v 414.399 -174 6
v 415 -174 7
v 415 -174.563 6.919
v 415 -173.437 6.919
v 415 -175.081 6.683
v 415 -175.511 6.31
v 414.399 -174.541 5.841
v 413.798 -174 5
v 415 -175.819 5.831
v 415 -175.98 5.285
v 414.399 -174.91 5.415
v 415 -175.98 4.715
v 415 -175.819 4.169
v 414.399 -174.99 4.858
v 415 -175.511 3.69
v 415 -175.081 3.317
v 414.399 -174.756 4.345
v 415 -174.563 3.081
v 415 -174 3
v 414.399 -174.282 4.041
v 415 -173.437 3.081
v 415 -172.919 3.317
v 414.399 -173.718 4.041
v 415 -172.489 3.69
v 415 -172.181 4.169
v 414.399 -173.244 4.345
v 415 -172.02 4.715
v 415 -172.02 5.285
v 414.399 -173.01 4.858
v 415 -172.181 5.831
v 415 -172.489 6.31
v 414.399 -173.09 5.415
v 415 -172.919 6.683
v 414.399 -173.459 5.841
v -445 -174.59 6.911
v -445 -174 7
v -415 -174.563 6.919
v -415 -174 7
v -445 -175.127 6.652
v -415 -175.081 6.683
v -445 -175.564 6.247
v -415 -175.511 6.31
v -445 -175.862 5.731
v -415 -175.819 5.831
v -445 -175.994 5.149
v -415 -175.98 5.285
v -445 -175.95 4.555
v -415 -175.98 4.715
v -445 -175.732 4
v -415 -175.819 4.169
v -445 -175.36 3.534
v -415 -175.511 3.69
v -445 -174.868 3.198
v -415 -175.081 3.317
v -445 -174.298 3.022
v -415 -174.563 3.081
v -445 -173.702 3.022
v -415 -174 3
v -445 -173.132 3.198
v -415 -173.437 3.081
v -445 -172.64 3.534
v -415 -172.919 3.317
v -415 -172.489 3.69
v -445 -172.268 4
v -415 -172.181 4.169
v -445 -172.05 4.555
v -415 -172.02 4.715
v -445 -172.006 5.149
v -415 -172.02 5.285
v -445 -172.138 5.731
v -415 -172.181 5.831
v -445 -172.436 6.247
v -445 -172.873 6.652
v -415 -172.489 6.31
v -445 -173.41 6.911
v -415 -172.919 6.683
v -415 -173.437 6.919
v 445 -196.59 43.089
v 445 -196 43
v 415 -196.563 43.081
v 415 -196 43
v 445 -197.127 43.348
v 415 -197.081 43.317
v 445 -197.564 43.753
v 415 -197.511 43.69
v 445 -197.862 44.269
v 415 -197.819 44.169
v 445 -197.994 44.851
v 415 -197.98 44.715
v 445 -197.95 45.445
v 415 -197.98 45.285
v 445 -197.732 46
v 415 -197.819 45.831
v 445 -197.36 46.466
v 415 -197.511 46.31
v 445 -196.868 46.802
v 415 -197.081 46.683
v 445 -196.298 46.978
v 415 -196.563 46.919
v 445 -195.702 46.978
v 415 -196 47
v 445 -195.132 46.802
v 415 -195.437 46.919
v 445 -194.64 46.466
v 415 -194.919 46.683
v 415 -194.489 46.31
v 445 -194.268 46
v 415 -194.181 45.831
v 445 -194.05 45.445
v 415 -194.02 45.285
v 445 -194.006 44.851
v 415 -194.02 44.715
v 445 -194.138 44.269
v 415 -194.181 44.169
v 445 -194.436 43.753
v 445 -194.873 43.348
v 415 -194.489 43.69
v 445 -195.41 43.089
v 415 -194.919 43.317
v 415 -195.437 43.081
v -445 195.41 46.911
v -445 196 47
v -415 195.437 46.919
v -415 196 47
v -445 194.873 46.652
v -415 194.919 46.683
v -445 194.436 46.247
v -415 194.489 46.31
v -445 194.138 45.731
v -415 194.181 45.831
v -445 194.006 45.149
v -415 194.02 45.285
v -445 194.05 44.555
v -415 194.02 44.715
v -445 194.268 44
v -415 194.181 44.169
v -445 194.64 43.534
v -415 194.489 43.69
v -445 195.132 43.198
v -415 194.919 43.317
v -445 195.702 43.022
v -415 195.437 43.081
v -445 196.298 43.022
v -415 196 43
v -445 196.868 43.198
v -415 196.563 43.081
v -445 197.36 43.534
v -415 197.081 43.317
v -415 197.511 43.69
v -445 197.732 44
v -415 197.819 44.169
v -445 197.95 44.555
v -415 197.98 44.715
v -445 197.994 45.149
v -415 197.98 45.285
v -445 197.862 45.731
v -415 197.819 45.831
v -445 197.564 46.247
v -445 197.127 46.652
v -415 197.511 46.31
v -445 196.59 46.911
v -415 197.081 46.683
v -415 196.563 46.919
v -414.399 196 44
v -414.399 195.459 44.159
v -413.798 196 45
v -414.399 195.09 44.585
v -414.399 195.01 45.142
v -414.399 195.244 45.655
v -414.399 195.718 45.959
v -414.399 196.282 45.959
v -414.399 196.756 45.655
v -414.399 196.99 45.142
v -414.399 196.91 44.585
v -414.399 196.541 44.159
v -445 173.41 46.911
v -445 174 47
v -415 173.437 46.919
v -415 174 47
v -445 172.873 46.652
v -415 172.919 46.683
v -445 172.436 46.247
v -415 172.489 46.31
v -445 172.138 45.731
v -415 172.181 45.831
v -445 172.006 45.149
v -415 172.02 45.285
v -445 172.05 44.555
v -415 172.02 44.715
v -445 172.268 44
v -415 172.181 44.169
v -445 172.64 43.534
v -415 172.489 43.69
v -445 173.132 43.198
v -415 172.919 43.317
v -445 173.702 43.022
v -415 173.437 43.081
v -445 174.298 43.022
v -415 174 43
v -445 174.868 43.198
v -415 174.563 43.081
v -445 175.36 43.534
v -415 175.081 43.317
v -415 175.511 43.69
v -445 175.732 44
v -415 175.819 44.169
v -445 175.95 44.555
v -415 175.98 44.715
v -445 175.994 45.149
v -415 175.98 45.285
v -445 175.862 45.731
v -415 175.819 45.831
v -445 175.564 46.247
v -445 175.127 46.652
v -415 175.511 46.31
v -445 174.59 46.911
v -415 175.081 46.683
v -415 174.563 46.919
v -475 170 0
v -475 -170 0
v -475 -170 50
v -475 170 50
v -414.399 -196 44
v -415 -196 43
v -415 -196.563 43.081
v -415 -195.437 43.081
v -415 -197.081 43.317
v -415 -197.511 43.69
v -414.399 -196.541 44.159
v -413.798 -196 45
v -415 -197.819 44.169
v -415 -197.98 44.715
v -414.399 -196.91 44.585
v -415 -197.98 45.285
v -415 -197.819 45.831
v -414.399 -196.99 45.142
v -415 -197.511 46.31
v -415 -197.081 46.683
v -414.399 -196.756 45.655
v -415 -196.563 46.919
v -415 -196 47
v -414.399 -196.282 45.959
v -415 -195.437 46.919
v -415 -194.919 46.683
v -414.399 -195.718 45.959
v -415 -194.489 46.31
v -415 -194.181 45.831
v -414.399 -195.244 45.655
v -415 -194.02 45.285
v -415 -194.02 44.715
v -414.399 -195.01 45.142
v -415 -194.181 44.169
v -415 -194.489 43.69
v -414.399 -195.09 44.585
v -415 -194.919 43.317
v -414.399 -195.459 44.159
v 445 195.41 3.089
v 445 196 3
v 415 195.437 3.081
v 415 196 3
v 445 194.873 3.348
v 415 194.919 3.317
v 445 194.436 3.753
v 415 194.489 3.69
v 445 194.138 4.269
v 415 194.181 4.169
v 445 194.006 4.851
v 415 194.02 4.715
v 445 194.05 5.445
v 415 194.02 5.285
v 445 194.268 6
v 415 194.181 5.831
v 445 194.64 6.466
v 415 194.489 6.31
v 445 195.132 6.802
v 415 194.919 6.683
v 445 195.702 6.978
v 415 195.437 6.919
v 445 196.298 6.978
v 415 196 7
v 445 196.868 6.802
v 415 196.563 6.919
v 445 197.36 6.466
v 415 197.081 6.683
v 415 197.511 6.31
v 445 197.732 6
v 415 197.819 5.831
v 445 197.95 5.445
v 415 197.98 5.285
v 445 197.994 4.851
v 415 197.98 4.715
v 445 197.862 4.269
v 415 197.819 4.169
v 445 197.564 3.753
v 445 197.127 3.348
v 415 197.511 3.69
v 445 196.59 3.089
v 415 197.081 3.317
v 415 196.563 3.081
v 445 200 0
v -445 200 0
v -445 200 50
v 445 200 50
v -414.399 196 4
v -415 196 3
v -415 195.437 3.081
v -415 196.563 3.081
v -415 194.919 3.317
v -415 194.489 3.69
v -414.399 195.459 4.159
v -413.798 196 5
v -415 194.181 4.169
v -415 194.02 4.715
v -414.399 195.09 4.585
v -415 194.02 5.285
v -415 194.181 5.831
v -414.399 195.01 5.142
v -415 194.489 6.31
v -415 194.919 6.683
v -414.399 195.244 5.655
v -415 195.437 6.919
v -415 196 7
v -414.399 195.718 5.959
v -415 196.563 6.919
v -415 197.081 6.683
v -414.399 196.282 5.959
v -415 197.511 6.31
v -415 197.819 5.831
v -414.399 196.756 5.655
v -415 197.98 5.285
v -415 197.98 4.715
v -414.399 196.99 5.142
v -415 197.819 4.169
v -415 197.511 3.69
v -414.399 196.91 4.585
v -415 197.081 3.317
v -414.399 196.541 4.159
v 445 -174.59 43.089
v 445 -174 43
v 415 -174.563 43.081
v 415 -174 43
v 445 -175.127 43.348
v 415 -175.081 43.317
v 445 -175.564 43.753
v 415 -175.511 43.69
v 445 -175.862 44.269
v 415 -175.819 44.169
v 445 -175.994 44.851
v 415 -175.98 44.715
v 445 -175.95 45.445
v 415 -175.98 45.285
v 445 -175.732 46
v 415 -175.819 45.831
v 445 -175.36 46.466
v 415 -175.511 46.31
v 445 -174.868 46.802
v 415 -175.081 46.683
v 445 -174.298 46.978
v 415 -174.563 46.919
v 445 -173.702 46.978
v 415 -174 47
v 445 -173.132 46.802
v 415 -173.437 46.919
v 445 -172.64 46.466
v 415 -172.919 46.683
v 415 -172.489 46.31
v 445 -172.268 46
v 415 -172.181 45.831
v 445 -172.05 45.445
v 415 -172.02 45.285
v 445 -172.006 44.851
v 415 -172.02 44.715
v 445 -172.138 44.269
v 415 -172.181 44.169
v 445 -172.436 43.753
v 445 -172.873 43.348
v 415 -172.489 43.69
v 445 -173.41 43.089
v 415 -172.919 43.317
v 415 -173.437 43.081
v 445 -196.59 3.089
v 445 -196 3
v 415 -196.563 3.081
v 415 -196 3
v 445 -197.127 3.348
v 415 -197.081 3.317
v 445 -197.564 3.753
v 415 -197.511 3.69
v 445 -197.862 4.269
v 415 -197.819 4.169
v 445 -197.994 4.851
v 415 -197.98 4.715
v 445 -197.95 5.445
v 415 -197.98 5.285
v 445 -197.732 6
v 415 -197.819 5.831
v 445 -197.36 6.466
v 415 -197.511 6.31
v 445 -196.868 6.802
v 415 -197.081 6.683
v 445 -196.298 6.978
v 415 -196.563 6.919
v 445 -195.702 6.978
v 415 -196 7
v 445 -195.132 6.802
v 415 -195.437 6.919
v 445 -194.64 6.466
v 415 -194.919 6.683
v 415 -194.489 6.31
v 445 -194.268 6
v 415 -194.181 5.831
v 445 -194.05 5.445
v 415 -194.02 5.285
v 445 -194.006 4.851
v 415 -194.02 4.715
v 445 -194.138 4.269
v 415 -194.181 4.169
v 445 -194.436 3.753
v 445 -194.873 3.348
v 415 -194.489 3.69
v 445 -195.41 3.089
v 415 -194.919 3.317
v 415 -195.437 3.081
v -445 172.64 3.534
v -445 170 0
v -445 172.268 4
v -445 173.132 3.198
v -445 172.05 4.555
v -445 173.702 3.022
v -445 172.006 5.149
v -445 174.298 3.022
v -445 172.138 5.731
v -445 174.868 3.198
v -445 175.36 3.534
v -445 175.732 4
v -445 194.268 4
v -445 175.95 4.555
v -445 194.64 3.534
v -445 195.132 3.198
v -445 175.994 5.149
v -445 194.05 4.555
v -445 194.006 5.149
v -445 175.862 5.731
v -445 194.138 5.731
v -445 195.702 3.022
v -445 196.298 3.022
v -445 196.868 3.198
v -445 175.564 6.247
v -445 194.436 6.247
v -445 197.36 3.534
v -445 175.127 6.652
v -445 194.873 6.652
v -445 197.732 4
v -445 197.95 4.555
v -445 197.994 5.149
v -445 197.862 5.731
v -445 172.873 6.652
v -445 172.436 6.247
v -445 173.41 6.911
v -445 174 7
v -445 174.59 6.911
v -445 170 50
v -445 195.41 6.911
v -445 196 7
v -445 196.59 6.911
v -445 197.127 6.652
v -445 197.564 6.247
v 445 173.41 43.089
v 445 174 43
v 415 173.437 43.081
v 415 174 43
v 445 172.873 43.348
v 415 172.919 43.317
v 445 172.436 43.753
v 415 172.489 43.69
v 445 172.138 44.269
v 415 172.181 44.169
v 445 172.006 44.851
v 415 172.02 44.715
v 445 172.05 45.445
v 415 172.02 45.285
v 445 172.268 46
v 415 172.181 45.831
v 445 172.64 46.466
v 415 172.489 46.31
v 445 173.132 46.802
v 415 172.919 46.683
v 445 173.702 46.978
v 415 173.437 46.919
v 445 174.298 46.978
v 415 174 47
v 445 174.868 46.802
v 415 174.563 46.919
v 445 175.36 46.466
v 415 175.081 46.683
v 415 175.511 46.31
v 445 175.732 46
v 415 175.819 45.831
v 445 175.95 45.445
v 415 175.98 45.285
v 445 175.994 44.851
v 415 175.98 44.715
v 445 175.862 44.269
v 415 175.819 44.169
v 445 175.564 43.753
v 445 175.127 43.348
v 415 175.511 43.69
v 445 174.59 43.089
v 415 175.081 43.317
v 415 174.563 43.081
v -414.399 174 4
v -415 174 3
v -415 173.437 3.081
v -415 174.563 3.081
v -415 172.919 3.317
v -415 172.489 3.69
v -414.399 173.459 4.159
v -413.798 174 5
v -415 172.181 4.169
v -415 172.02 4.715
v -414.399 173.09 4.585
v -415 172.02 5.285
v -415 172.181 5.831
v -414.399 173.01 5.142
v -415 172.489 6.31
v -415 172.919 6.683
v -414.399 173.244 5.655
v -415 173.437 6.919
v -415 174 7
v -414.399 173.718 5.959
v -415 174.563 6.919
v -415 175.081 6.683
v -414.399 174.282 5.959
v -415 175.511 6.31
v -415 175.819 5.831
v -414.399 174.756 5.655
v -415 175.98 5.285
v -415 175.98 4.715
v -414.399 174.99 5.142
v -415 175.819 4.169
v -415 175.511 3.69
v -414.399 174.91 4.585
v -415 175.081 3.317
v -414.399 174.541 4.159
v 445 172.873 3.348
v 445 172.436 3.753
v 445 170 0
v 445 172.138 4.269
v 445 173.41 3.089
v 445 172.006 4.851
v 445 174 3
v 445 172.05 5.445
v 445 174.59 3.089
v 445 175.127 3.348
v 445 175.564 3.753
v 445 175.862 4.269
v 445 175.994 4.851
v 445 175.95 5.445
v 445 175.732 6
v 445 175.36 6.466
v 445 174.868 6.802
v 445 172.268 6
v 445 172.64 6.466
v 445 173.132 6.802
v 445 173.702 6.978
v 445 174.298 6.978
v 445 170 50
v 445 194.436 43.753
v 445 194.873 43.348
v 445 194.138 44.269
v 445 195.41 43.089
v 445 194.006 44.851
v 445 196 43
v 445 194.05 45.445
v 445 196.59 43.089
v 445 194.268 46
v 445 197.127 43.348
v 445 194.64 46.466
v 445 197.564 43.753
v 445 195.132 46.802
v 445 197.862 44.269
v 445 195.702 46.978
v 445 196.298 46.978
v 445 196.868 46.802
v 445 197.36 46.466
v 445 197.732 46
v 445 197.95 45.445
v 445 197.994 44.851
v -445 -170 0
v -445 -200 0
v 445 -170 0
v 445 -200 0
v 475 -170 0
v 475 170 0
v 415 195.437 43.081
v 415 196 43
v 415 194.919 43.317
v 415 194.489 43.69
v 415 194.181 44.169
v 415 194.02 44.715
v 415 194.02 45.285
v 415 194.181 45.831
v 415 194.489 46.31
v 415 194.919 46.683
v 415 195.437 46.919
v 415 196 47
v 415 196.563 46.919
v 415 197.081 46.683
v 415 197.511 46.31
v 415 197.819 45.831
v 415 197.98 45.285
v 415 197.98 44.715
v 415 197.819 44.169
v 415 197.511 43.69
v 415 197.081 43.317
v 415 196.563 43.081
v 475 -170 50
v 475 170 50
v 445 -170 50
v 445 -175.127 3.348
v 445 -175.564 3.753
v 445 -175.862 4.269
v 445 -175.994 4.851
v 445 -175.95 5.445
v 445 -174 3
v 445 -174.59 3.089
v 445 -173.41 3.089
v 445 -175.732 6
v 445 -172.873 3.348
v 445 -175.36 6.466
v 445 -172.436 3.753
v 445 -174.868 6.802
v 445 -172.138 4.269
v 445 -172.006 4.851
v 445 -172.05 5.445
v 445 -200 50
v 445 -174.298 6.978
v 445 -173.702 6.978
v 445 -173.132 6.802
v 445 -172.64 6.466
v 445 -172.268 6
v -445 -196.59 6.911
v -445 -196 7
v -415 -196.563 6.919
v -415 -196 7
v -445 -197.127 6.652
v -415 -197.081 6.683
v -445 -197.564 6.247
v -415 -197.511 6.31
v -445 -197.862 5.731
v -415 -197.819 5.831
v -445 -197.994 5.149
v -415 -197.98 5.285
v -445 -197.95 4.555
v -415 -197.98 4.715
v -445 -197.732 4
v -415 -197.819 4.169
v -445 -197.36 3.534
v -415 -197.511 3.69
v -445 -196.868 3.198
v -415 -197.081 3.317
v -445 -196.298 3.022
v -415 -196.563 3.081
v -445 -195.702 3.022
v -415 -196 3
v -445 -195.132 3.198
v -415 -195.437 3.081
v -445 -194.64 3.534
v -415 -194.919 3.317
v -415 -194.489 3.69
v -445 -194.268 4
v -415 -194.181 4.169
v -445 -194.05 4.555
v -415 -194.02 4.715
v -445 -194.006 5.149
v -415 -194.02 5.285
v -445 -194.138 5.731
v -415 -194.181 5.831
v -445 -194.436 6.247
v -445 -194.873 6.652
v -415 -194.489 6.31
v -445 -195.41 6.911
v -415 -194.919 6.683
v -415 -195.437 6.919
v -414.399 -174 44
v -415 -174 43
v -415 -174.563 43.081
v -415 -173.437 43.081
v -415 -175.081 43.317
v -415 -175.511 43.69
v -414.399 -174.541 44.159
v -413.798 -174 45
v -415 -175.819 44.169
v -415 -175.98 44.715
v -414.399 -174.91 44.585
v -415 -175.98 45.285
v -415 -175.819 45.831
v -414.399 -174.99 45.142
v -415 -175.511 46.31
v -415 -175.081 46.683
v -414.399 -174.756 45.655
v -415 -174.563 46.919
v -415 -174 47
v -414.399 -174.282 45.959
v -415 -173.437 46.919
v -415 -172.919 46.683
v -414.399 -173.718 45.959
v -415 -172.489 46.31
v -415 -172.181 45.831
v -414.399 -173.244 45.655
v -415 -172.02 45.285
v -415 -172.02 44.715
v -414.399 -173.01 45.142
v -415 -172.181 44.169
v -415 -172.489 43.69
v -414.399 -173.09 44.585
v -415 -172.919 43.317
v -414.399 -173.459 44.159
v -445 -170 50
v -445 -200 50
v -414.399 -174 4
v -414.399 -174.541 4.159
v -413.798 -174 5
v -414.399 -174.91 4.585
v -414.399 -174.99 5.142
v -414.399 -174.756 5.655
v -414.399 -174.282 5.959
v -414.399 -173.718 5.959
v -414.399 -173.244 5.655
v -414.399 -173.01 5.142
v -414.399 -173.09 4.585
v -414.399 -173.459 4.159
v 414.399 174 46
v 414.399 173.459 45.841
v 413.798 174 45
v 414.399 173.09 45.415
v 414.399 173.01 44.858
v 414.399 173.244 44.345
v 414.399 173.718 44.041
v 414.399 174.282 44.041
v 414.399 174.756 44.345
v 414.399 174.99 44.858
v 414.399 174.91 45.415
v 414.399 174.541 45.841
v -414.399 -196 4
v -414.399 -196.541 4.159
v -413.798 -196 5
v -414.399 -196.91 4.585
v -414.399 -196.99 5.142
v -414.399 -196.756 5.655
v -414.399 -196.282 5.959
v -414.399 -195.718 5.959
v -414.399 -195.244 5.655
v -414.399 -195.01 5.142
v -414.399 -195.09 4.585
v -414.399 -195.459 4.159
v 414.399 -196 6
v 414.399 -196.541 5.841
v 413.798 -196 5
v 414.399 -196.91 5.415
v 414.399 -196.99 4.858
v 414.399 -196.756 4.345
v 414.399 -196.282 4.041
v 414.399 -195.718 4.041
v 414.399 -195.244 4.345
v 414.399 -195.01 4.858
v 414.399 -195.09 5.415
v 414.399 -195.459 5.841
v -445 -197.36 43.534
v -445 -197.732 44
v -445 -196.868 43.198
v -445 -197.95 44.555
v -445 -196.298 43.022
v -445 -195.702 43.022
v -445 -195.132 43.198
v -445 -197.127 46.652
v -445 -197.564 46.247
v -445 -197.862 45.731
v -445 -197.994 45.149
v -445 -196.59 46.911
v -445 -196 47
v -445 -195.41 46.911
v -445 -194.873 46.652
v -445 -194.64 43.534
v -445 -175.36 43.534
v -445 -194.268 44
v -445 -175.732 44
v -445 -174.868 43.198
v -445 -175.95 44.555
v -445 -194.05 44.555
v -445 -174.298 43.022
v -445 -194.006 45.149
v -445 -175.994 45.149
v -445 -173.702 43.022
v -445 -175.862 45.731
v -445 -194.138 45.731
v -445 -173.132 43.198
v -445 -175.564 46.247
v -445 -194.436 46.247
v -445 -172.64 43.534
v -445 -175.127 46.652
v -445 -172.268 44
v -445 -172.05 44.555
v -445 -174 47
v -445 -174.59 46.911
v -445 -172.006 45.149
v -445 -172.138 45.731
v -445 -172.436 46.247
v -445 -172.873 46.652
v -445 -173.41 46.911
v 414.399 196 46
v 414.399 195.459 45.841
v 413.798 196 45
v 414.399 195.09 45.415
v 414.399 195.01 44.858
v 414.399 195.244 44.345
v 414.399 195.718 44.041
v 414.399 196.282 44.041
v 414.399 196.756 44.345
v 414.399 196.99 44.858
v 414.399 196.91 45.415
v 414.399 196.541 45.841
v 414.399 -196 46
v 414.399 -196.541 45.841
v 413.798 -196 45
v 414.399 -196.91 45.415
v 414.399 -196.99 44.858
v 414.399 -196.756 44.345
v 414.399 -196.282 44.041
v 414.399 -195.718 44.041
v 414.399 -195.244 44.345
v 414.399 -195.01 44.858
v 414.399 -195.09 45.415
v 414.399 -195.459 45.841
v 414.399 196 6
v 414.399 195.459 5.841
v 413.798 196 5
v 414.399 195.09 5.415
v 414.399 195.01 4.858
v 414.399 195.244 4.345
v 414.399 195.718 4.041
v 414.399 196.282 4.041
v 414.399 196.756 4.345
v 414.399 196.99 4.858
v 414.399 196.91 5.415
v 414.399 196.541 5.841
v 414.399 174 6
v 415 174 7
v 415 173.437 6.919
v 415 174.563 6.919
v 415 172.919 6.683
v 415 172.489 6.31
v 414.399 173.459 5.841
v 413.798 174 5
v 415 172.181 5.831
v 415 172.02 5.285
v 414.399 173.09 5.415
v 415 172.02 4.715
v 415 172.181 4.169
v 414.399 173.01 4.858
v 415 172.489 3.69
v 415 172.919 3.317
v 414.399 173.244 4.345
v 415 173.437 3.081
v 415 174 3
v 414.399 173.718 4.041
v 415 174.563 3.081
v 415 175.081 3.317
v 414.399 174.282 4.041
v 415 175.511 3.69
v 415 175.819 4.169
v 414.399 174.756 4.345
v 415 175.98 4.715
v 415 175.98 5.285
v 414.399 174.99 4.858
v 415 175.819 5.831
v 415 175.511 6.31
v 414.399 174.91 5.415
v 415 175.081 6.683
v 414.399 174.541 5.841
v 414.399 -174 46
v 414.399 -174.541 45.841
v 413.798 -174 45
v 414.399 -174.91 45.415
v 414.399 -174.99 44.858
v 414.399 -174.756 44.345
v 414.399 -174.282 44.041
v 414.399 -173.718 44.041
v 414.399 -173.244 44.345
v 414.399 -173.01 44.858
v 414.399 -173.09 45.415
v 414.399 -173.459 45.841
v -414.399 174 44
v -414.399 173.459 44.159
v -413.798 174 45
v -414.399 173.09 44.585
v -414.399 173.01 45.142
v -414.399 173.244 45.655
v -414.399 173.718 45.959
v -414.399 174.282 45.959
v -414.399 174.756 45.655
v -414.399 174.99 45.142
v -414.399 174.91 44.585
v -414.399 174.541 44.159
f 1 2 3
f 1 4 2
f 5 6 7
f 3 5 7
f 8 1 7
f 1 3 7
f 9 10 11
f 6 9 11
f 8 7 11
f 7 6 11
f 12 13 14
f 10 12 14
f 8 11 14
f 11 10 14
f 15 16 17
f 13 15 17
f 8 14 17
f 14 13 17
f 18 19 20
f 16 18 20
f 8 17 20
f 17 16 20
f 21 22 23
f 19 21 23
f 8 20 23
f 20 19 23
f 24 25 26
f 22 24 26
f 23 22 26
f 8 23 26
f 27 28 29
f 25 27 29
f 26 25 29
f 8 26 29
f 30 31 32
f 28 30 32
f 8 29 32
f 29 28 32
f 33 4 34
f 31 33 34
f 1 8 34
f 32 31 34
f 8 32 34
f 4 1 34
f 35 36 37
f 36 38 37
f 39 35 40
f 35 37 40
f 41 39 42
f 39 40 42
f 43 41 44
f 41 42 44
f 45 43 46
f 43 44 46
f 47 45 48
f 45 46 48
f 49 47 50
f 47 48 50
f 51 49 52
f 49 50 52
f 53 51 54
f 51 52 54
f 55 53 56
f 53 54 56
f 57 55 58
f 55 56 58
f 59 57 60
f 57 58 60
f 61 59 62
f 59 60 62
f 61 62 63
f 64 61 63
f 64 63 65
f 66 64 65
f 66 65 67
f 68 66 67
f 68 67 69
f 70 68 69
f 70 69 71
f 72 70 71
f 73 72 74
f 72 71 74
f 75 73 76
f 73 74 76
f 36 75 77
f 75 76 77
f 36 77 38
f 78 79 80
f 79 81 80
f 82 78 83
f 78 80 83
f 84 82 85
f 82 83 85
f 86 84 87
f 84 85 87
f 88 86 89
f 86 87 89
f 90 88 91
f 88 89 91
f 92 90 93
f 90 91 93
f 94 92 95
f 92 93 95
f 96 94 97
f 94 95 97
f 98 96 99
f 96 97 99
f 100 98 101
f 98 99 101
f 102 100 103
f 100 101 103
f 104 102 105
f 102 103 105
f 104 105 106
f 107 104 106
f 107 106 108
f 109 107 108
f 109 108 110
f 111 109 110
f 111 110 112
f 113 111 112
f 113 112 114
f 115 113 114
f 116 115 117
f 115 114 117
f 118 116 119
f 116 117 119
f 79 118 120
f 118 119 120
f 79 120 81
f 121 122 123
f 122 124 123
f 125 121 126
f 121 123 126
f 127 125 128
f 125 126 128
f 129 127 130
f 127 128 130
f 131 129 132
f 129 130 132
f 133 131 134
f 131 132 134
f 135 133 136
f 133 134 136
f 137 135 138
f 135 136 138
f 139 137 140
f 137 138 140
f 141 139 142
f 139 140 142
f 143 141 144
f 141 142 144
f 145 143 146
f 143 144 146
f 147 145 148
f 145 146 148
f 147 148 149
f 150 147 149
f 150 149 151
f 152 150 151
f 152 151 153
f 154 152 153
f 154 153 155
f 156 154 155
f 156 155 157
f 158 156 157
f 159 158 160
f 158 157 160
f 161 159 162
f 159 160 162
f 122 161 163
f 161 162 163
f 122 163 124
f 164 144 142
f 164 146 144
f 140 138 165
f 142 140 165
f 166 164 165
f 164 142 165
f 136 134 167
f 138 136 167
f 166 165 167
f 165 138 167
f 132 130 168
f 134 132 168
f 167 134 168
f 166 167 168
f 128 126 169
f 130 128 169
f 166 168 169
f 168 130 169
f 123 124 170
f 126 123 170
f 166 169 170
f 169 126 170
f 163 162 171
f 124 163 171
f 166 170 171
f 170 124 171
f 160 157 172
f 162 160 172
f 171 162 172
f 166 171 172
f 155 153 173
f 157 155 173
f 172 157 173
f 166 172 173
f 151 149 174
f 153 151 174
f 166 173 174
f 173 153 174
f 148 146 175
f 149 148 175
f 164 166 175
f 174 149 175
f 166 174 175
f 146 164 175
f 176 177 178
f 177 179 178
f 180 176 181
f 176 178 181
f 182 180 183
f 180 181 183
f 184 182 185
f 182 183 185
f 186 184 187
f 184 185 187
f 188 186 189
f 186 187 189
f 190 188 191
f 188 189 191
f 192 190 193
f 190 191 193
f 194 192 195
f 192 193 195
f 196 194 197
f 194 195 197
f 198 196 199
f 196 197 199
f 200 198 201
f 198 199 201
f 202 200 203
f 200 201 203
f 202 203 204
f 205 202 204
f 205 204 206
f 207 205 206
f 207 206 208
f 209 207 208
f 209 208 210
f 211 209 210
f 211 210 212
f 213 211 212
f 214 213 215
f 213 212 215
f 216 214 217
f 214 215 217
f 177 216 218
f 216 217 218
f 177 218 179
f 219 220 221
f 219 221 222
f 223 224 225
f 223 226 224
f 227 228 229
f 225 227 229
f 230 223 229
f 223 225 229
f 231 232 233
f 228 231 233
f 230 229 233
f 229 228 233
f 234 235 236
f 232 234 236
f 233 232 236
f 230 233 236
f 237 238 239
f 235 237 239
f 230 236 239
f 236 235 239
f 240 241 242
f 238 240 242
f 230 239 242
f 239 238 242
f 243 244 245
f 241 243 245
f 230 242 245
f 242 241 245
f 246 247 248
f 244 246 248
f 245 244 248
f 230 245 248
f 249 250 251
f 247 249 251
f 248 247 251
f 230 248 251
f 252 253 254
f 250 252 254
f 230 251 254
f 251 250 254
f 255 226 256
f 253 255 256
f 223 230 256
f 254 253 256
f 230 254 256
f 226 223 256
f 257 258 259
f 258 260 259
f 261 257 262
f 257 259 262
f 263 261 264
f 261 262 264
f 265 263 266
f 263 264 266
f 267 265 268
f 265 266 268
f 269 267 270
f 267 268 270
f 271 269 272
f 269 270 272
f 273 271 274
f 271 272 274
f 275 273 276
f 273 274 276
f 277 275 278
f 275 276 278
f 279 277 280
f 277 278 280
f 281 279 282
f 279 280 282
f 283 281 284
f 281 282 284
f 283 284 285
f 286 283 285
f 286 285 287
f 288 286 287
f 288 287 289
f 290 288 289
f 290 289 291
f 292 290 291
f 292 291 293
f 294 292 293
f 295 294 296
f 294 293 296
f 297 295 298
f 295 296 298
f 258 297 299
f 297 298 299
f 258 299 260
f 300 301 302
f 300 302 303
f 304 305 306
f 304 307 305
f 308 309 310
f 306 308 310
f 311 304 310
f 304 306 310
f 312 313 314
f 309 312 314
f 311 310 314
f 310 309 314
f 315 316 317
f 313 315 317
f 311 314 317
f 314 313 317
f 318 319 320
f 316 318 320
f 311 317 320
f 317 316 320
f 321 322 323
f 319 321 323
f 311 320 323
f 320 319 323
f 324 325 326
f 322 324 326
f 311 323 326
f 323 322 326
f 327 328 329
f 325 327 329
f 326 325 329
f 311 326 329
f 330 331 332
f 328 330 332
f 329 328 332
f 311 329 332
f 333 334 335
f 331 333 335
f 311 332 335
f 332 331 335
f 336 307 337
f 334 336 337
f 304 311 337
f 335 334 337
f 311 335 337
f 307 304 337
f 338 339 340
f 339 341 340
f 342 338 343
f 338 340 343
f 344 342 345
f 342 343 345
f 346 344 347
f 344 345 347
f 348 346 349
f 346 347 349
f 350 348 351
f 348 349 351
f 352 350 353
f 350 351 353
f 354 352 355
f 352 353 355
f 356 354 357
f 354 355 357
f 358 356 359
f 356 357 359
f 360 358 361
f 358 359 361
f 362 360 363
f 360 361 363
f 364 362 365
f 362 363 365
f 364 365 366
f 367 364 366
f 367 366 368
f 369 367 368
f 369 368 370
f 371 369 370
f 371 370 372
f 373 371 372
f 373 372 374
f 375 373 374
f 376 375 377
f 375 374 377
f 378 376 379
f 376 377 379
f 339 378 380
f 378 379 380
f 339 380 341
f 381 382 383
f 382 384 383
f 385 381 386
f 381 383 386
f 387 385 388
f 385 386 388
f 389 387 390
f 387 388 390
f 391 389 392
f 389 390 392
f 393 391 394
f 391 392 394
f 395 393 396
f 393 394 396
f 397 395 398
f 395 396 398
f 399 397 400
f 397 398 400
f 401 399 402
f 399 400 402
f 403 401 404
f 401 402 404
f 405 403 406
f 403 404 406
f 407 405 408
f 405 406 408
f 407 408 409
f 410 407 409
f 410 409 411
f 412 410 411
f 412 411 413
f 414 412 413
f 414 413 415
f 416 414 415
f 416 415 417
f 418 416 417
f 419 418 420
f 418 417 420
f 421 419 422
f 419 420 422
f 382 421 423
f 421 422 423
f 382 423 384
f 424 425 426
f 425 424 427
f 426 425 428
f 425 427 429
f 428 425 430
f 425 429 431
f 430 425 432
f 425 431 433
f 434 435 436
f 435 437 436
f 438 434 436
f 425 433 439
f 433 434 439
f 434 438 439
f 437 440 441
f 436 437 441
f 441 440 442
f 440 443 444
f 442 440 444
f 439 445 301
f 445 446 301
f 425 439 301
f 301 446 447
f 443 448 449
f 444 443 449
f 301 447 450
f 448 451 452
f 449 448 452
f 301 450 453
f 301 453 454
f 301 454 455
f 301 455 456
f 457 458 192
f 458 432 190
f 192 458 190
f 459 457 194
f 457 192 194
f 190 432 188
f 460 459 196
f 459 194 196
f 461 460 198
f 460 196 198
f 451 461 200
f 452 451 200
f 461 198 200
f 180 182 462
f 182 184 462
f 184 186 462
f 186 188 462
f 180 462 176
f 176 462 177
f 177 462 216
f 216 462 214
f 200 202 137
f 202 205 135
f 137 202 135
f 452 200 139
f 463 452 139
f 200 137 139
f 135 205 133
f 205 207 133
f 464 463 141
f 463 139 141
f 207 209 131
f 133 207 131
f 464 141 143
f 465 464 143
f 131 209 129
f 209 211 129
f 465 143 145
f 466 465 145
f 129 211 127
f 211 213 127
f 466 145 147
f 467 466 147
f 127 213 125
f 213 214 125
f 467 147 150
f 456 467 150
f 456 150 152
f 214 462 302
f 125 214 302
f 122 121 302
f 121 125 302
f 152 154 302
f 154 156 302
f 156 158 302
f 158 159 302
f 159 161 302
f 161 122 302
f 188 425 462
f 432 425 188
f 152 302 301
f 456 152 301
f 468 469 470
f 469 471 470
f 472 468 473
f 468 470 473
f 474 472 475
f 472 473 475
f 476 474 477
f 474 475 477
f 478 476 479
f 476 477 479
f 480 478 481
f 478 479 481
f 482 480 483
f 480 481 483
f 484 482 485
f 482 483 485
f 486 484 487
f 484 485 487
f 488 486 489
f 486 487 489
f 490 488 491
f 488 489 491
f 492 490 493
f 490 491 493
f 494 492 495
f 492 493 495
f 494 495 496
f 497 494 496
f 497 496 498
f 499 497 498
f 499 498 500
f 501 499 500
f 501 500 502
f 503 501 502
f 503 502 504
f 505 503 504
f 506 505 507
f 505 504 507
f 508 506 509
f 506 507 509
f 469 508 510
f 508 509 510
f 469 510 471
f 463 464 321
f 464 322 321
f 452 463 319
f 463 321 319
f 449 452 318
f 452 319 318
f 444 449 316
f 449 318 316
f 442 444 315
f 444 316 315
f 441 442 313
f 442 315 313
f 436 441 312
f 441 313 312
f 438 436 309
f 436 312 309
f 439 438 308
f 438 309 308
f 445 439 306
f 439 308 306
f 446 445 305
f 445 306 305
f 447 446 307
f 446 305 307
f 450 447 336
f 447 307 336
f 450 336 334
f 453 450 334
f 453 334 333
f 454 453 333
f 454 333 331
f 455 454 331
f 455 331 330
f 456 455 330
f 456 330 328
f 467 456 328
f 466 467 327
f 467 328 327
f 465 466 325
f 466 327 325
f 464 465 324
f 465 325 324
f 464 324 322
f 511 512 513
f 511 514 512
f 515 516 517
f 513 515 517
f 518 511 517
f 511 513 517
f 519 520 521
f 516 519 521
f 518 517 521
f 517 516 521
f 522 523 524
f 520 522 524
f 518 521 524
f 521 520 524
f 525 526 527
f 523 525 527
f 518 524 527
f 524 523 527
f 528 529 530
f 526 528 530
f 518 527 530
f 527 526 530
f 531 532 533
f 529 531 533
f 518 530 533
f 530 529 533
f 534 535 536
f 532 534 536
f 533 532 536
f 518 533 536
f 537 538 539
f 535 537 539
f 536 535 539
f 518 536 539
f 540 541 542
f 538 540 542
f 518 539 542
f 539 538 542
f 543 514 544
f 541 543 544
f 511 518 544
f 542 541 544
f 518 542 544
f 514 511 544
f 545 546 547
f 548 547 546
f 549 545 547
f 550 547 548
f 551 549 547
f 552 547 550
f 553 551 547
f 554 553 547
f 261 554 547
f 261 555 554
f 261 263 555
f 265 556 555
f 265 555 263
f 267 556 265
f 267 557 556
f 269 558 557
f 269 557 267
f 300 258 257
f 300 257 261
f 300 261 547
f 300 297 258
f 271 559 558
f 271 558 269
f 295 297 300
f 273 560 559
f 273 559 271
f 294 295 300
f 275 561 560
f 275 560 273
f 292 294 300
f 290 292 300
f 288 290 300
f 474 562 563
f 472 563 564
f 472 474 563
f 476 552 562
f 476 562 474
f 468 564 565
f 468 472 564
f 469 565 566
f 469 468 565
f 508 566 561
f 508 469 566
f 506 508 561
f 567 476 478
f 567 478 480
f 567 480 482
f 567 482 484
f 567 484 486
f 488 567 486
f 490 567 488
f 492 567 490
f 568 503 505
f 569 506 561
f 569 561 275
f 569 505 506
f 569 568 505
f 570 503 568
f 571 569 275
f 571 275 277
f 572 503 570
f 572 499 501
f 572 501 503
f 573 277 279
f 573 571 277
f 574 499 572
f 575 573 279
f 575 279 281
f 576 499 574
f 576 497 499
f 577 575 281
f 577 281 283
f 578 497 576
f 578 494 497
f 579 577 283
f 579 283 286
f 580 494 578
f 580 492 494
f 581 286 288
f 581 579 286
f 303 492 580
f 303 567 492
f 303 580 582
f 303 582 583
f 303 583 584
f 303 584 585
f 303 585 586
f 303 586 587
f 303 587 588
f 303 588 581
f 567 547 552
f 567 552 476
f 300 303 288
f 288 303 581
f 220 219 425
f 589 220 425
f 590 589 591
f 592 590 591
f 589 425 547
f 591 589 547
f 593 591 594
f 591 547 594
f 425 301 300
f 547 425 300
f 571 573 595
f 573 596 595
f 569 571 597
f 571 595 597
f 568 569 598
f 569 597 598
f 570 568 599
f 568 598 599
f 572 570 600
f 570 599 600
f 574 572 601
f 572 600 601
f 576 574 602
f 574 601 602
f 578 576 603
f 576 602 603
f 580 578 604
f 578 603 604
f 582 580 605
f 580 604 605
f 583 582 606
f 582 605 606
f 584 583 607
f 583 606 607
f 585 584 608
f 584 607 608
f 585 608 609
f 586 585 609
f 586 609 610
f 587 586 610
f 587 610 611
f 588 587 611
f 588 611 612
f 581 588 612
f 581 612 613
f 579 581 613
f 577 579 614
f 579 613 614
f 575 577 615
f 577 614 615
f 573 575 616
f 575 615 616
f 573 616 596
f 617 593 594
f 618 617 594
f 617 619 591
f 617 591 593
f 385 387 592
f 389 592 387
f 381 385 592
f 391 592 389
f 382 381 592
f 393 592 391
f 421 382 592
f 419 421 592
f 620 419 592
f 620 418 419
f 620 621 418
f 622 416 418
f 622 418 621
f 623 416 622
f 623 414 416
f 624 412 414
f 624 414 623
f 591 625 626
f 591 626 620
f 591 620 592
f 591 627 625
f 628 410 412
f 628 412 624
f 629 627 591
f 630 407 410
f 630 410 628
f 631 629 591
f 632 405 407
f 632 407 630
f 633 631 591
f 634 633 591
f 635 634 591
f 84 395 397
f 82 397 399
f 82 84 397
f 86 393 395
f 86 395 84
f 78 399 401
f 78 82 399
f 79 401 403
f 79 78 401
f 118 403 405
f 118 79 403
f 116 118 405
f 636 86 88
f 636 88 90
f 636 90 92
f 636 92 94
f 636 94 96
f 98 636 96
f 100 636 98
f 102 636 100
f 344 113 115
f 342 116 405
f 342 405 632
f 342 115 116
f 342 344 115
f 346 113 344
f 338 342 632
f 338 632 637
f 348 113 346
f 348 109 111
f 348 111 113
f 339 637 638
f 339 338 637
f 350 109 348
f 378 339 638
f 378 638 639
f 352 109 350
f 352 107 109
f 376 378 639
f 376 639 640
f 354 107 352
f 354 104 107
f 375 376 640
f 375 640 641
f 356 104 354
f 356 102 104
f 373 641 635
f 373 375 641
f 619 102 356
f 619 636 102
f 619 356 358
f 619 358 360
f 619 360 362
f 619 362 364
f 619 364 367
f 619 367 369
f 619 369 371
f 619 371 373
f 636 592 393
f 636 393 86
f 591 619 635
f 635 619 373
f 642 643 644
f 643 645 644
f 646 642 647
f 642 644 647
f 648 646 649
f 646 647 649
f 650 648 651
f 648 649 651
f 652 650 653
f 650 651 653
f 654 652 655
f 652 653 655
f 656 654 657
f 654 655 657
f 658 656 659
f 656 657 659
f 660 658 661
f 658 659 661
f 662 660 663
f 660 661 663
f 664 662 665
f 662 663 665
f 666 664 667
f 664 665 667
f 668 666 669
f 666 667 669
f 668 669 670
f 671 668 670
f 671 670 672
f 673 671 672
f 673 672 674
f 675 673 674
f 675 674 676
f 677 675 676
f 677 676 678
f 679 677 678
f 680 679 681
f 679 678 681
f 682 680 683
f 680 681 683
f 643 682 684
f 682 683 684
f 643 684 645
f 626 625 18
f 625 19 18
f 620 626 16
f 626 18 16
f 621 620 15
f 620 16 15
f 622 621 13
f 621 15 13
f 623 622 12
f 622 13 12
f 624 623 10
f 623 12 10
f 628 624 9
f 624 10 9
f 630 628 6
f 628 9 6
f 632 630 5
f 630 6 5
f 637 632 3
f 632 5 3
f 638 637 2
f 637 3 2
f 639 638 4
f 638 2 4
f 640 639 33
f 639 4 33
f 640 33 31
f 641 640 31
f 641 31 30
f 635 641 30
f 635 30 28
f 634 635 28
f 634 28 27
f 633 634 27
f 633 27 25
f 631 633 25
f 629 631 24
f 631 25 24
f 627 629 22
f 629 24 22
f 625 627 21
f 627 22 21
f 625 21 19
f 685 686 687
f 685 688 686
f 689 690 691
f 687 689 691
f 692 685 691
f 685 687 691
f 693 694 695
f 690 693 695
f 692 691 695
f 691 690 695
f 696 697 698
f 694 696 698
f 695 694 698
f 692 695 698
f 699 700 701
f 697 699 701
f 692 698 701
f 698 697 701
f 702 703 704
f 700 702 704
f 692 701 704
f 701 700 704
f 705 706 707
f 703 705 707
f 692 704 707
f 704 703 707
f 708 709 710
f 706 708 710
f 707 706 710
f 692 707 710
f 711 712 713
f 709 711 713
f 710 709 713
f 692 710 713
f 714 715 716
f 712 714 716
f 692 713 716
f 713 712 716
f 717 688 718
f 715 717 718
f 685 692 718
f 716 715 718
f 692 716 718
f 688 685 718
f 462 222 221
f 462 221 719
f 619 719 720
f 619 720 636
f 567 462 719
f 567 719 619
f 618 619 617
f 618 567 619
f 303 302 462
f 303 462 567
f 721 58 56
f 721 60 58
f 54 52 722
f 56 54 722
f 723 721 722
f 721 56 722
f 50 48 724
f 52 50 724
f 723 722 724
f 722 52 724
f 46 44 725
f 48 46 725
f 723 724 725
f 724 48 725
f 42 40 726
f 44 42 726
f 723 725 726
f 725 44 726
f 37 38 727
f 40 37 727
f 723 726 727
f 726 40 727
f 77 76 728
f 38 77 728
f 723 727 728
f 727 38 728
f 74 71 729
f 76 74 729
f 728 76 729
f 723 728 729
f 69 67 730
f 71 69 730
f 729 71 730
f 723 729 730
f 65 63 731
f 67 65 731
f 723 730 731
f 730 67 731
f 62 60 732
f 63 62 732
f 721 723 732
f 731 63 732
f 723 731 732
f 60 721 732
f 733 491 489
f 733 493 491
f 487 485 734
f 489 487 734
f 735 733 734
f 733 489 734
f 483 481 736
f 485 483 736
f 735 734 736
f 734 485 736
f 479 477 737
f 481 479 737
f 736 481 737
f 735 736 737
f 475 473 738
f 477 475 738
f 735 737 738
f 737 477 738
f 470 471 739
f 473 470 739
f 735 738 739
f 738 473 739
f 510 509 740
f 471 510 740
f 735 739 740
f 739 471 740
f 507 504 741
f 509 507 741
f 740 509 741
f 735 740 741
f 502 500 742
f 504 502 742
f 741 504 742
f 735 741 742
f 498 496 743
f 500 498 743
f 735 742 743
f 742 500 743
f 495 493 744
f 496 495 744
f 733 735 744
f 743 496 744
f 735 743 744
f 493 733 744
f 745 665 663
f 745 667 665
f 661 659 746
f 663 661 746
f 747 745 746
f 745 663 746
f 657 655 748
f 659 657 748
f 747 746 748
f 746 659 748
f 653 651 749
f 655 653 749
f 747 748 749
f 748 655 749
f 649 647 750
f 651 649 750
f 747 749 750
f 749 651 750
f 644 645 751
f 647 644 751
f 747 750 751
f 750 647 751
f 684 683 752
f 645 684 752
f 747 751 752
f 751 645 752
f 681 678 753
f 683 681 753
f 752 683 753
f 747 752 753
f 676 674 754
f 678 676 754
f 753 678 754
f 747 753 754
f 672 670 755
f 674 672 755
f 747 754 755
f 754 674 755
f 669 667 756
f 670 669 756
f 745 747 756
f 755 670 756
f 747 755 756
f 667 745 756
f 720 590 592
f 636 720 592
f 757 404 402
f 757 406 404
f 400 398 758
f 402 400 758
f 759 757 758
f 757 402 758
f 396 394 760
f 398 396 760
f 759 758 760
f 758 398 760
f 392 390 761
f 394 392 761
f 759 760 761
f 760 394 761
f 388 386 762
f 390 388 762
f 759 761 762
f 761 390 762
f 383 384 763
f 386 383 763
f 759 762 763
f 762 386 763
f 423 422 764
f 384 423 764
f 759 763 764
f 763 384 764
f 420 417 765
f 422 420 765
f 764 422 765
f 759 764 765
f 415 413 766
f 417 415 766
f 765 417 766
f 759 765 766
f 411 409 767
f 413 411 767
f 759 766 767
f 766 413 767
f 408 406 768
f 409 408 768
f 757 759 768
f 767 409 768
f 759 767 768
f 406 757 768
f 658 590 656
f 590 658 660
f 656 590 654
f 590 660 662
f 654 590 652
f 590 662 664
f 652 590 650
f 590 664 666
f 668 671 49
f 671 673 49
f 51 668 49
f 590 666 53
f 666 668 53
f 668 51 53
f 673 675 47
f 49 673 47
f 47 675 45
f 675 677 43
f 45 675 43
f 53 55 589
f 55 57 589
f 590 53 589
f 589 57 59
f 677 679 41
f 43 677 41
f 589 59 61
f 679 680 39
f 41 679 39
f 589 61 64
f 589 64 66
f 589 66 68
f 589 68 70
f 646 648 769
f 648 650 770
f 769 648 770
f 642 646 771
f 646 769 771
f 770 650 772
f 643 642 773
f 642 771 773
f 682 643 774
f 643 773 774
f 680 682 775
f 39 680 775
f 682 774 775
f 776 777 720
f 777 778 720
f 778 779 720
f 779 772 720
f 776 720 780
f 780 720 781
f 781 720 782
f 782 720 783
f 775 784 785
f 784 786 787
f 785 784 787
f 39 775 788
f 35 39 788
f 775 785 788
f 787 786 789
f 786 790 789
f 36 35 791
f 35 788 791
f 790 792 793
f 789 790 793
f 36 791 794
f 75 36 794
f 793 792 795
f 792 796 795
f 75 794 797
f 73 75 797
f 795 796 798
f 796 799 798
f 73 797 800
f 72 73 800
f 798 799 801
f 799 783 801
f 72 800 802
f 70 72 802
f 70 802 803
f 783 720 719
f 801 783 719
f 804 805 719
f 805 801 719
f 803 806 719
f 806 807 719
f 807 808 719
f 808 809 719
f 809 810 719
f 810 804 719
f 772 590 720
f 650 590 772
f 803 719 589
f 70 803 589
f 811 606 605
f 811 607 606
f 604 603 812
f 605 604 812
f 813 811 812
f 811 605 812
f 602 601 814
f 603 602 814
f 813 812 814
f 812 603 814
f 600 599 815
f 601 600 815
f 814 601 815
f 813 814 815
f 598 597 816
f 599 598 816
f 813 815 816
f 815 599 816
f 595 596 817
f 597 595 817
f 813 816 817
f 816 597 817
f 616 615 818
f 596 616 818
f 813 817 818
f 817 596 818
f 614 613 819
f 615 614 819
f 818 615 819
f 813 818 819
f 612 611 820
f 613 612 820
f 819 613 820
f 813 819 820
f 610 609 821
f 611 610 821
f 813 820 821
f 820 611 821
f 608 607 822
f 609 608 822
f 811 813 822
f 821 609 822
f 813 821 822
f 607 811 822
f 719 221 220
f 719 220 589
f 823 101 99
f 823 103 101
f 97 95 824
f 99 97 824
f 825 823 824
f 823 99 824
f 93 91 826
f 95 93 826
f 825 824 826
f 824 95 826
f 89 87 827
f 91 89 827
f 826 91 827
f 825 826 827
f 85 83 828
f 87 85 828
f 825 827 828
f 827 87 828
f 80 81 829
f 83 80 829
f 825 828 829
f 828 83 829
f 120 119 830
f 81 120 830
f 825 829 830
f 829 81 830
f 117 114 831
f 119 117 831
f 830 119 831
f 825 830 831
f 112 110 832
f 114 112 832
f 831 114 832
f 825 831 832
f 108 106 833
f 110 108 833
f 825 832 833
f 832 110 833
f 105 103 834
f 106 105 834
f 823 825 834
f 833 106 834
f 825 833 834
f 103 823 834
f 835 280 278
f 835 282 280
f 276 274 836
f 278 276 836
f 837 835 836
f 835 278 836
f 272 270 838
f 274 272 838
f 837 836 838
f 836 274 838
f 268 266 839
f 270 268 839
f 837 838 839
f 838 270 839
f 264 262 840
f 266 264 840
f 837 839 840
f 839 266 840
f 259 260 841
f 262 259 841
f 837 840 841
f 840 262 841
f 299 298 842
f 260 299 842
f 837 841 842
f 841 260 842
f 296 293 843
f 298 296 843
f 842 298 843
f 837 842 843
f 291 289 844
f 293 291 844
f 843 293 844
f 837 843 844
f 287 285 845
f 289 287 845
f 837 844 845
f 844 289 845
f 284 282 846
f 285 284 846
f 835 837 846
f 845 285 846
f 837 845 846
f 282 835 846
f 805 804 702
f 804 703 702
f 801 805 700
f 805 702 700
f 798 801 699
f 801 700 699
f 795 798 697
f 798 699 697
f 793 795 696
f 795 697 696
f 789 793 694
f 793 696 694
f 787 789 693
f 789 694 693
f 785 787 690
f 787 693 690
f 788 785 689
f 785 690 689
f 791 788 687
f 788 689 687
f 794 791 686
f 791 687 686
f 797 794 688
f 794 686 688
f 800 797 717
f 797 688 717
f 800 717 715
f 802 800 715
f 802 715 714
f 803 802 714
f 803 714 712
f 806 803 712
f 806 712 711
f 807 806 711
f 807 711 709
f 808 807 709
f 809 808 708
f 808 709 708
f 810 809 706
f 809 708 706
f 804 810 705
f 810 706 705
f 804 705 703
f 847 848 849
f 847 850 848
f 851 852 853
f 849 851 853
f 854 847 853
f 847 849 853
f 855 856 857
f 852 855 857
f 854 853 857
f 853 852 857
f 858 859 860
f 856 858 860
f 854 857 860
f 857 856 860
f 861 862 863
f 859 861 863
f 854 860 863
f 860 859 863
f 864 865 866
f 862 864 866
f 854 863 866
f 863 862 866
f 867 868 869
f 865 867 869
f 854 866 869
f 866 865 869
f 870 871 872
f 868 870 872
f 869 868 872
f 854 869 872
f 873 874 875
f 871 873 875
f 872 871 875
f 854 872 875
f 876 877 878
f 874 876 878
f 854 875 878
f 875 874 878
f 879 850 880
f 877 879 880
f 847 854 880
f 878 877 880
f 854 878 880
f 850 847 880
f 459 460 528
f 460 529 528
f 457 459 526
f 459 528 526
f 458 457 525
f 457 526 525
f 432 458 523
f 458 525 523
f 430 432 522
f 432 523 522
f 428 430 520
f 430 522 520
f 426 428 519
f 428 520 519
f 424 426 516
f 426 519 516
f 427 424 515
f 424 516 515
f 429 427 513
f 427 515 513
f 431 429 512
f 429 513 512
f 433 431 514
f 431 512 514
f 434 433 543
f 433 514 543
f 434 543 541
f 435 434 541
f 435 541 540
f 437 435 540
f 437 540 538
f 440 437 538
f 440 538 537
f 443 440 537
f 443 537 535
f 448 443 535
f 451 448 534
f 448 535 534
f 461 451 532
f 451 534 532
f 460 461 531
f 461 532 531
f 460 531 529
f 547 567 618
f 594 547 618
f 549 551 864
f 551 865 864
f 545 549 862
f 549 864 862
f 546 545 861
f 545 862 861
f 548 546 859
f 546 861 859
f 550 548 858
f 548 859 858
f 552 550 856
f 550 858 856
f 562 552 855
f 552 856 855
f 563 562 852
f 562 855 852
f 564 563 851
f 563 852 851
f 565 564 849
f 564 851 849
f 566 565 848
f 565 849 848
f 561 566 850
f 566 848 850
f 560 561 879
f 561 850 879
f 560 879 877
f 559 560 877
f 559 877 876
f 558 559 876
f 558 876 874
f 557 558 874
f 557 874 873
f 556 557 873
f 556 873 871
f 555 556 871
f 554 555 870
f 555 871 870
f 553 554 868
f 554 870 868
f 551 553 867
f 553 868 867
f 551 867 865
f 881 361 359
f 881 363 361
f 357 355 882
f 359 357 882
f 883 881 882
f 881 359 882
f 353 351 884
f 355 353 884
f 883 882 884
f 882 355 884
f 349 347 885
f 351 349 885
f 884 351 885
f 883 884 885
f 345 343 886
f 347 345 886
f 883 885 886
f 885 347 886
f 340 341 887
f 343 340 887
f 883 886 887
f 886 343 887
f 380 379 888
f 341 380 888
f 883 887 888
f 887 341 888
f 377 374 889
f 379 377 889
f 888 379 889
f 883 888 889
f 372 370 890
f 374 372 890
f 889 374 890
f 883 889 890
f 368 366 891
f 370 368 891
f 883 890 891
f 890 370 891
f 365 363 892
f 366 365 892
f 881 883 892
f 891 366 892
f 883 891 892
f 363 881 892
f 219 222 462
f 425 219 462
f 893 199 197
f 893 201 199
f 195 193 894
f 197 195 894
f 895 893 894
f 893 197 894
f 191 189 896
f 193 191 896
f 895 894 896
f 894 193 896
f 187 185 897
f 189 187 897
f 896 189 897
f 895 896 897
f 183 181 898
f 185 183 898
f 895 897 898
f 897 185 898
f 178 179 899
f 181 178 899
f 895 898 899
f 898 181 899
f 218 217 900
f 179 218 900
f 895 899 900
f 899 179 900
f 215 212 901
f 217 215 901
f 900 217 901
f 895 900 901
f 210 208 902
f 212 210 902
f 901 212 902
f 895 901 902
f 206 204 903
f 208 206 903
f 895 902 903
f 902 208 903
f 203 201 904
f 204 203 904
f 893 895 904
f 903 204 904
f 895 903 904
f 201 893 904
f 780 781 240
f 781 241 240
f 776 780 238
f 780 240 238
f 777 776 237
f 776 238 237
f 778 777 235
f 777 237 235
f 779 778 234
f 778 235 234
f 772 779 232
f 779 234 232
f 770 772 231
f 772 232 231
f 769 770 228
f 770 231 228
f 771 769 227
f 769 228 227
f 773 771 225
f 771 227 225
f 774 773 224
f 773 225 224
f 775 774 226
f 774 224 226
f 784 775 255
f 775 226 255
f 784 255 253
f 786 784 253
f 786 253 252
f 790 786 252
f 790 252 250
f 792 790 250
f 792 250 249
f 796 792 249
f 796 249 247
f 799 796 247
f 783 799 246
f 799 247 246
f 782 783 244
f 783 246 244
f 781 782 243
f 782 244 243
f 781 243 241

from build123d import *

# Parameters (mm, degrees)
SKETCH1_W                 = 950
SKETCH1_H                 = 400
BOSS_EXTRUDE1_DEPTH       = 50
SKETCH2_W                 = 30
SKETCH2_H                 = 30
CUT_EXTRUDE1_DEPTH        = 518.80787943
F_4_0MM_DOWEL_HOLE1_D     = 4
F_4_0MM_DOWEL_HOLE1_DEPTH = 30
F_4_0MM_DOWEL_HOLE1_TIP   = 1.201721238
F_4_0MM_DOWEL_HOLE2_D     = 4
F_4_0MM_DOWEL_HOLE2_DEPTH = 30
F_4_0MM_DOWEL_HOLE2_TIP   = 1.201721238
F_4_0MM_DOWEL_HOLE3_D     = 4
F_4_0MM_DOWEL_HOLE3_DEPTH = 30
F_4_0MM_DOWEL_HOLE3_TIP   = 1.201721238
F_4_0MM_DOWEL_HOLE4_D     = 4
F_4_0MM_DOWEL_HOLE4_DEPTH = 30
F_4_0MM_DOWEL_HOLE4_TIP   = 1.201721238


with BuildPart() as part:
    # Sketch1 → Boss-Extrude1 (new body)
    with BuildSketch(Plane.XY):
        Rectangle(SKETCH1_W, SKETCH1_H)
    extrude(amount=BOSS_EXTRUDE1_DEPTH)

    # Sketch2 → Cut-Extrude1 (cut, through all)
    with BuildSketch(Plane.XY.offset(50)):
        with Locations((-460, 185)):
            Rectangle(SKETCH2_W, SKETCH2_H)
        with Locations((-460, -185)):
            Rectangle(SKETCH2_W, SKETCH2_H)
        with Locations((460, -185)):
            Rectangle(SKETCH2_W, SKETCH2_H)
        with Locations((460, 185)):
            Rectangle(SKETCH2_W, SKETCH2_H)
    extrude(amount=-CUT_EXTRUDE1_DEPTH, mode=Mode.SUBTRACT)

    # Ø4.0mm Dowel Hole1
    with Locations(Plane(origin=(445, -196, 45), x_dir=(0, 0, 1), z_dir=(1, 0, 0))):
        with Locations((0, 0), (0, -22), (-40, 0), (-40, -22)):
            Hole(F_4_0MM_DOWEL_HOLE1_D / 2, depth=F_4_0MM_DOWEL_HOLE1_DEPTH)
            with Locations((0, 0, -(F_4_0MM_DOWEL_HOLE1_DEPTH + F_4_0MM_DOWEL_HOLE1_TIP / 2))):  # 118° drill point
                Cone(0, F_4_0MM_DOWEL_HOLE1_D / 2, F_4_0MM_DOWEL_HOLE1_TIP, mode=Mode.SUBTRACT)

    # Ø4.0mm Dowel Hole2
    with Locations(Plane(origin=(-445, -174, 5), x_dir=(0, 0, -1), z_dir=(-1, 0, 0))):
        with Locations((0, 0), (-40, 0), (-40, 22), (0, 22)):
            Hole(F_4_0MM_DOWEL_HOLE2_D / 2, depth=F_4_0MM_DOWEL_HOLE2_DEPTH)
            with Locations((0, 0, -(F_4_0MM_DOWEL_HOLE2_DEPTH + F_4_0MM_DOWEL_HOLE2_TIP / 2))):  # 118° drill point
                Cone(0, F_4_0MM_DOWEL_HOLE2_D / 2, F_4_0MM_DOWEL_HOLE2_TIP, mode=Mode.SUBTRACT)

    # Ø4.0mm Dowel Hole3
    with Locations(Plane(origin=(-445, 174, 45), x_dir=(0, 0, -1), z_dir=(-1, 0, 0))):
        with Locations((0, 0), (0, -22), (40, -22), (40, 0)):
            Hole(F_4_0MM_DOWEL_HOLE3_D / 2, depth=F_4_0MM_DOWEL_HOLE3_DEPTH)
            with Locations((0, 0, -(F_4_0MM_DOWEL_HOLE3_DEPTH + F_4_0MM_DOWEL_HOLE3_TIP / 2))):  # 118° drill point
                Cone(0, F_4_0MM_DOWEL_HOLE3_D / 2, F_4_0MM_DOWEL_HOLE3_TIP, mode=Mode.SUBTRACT)

    # Ø4.0mm Dowel Hole4
    with Locations(Plane(origin=(445, 174, 45), x_dir=(0, 0, 1), z_dir=(1, 0, 0))):
        with Locations((0, 0), (0, -22), (-40, 0), (-40, -22)):
            Hole(F_4_0MM_DOWEL_HOLE4_D / 2, depth=F_4_0MM_DOWEL_HOLE4_DEPTH)
            with Locations((0, 0, -(F_4_0MM_DOWEL_HOLE4_DEPTH + F_4_0MM_DOWEL_HOLE4_TIP / 2))):  # 118° drill point
                Cone(0, F_4_0MM_DOWEL_HOLE4_D / 2, F_4_0MM_DOWEL_HOLE4_TIP, mode=Mode.SUBTRACT)


solid = part.part
